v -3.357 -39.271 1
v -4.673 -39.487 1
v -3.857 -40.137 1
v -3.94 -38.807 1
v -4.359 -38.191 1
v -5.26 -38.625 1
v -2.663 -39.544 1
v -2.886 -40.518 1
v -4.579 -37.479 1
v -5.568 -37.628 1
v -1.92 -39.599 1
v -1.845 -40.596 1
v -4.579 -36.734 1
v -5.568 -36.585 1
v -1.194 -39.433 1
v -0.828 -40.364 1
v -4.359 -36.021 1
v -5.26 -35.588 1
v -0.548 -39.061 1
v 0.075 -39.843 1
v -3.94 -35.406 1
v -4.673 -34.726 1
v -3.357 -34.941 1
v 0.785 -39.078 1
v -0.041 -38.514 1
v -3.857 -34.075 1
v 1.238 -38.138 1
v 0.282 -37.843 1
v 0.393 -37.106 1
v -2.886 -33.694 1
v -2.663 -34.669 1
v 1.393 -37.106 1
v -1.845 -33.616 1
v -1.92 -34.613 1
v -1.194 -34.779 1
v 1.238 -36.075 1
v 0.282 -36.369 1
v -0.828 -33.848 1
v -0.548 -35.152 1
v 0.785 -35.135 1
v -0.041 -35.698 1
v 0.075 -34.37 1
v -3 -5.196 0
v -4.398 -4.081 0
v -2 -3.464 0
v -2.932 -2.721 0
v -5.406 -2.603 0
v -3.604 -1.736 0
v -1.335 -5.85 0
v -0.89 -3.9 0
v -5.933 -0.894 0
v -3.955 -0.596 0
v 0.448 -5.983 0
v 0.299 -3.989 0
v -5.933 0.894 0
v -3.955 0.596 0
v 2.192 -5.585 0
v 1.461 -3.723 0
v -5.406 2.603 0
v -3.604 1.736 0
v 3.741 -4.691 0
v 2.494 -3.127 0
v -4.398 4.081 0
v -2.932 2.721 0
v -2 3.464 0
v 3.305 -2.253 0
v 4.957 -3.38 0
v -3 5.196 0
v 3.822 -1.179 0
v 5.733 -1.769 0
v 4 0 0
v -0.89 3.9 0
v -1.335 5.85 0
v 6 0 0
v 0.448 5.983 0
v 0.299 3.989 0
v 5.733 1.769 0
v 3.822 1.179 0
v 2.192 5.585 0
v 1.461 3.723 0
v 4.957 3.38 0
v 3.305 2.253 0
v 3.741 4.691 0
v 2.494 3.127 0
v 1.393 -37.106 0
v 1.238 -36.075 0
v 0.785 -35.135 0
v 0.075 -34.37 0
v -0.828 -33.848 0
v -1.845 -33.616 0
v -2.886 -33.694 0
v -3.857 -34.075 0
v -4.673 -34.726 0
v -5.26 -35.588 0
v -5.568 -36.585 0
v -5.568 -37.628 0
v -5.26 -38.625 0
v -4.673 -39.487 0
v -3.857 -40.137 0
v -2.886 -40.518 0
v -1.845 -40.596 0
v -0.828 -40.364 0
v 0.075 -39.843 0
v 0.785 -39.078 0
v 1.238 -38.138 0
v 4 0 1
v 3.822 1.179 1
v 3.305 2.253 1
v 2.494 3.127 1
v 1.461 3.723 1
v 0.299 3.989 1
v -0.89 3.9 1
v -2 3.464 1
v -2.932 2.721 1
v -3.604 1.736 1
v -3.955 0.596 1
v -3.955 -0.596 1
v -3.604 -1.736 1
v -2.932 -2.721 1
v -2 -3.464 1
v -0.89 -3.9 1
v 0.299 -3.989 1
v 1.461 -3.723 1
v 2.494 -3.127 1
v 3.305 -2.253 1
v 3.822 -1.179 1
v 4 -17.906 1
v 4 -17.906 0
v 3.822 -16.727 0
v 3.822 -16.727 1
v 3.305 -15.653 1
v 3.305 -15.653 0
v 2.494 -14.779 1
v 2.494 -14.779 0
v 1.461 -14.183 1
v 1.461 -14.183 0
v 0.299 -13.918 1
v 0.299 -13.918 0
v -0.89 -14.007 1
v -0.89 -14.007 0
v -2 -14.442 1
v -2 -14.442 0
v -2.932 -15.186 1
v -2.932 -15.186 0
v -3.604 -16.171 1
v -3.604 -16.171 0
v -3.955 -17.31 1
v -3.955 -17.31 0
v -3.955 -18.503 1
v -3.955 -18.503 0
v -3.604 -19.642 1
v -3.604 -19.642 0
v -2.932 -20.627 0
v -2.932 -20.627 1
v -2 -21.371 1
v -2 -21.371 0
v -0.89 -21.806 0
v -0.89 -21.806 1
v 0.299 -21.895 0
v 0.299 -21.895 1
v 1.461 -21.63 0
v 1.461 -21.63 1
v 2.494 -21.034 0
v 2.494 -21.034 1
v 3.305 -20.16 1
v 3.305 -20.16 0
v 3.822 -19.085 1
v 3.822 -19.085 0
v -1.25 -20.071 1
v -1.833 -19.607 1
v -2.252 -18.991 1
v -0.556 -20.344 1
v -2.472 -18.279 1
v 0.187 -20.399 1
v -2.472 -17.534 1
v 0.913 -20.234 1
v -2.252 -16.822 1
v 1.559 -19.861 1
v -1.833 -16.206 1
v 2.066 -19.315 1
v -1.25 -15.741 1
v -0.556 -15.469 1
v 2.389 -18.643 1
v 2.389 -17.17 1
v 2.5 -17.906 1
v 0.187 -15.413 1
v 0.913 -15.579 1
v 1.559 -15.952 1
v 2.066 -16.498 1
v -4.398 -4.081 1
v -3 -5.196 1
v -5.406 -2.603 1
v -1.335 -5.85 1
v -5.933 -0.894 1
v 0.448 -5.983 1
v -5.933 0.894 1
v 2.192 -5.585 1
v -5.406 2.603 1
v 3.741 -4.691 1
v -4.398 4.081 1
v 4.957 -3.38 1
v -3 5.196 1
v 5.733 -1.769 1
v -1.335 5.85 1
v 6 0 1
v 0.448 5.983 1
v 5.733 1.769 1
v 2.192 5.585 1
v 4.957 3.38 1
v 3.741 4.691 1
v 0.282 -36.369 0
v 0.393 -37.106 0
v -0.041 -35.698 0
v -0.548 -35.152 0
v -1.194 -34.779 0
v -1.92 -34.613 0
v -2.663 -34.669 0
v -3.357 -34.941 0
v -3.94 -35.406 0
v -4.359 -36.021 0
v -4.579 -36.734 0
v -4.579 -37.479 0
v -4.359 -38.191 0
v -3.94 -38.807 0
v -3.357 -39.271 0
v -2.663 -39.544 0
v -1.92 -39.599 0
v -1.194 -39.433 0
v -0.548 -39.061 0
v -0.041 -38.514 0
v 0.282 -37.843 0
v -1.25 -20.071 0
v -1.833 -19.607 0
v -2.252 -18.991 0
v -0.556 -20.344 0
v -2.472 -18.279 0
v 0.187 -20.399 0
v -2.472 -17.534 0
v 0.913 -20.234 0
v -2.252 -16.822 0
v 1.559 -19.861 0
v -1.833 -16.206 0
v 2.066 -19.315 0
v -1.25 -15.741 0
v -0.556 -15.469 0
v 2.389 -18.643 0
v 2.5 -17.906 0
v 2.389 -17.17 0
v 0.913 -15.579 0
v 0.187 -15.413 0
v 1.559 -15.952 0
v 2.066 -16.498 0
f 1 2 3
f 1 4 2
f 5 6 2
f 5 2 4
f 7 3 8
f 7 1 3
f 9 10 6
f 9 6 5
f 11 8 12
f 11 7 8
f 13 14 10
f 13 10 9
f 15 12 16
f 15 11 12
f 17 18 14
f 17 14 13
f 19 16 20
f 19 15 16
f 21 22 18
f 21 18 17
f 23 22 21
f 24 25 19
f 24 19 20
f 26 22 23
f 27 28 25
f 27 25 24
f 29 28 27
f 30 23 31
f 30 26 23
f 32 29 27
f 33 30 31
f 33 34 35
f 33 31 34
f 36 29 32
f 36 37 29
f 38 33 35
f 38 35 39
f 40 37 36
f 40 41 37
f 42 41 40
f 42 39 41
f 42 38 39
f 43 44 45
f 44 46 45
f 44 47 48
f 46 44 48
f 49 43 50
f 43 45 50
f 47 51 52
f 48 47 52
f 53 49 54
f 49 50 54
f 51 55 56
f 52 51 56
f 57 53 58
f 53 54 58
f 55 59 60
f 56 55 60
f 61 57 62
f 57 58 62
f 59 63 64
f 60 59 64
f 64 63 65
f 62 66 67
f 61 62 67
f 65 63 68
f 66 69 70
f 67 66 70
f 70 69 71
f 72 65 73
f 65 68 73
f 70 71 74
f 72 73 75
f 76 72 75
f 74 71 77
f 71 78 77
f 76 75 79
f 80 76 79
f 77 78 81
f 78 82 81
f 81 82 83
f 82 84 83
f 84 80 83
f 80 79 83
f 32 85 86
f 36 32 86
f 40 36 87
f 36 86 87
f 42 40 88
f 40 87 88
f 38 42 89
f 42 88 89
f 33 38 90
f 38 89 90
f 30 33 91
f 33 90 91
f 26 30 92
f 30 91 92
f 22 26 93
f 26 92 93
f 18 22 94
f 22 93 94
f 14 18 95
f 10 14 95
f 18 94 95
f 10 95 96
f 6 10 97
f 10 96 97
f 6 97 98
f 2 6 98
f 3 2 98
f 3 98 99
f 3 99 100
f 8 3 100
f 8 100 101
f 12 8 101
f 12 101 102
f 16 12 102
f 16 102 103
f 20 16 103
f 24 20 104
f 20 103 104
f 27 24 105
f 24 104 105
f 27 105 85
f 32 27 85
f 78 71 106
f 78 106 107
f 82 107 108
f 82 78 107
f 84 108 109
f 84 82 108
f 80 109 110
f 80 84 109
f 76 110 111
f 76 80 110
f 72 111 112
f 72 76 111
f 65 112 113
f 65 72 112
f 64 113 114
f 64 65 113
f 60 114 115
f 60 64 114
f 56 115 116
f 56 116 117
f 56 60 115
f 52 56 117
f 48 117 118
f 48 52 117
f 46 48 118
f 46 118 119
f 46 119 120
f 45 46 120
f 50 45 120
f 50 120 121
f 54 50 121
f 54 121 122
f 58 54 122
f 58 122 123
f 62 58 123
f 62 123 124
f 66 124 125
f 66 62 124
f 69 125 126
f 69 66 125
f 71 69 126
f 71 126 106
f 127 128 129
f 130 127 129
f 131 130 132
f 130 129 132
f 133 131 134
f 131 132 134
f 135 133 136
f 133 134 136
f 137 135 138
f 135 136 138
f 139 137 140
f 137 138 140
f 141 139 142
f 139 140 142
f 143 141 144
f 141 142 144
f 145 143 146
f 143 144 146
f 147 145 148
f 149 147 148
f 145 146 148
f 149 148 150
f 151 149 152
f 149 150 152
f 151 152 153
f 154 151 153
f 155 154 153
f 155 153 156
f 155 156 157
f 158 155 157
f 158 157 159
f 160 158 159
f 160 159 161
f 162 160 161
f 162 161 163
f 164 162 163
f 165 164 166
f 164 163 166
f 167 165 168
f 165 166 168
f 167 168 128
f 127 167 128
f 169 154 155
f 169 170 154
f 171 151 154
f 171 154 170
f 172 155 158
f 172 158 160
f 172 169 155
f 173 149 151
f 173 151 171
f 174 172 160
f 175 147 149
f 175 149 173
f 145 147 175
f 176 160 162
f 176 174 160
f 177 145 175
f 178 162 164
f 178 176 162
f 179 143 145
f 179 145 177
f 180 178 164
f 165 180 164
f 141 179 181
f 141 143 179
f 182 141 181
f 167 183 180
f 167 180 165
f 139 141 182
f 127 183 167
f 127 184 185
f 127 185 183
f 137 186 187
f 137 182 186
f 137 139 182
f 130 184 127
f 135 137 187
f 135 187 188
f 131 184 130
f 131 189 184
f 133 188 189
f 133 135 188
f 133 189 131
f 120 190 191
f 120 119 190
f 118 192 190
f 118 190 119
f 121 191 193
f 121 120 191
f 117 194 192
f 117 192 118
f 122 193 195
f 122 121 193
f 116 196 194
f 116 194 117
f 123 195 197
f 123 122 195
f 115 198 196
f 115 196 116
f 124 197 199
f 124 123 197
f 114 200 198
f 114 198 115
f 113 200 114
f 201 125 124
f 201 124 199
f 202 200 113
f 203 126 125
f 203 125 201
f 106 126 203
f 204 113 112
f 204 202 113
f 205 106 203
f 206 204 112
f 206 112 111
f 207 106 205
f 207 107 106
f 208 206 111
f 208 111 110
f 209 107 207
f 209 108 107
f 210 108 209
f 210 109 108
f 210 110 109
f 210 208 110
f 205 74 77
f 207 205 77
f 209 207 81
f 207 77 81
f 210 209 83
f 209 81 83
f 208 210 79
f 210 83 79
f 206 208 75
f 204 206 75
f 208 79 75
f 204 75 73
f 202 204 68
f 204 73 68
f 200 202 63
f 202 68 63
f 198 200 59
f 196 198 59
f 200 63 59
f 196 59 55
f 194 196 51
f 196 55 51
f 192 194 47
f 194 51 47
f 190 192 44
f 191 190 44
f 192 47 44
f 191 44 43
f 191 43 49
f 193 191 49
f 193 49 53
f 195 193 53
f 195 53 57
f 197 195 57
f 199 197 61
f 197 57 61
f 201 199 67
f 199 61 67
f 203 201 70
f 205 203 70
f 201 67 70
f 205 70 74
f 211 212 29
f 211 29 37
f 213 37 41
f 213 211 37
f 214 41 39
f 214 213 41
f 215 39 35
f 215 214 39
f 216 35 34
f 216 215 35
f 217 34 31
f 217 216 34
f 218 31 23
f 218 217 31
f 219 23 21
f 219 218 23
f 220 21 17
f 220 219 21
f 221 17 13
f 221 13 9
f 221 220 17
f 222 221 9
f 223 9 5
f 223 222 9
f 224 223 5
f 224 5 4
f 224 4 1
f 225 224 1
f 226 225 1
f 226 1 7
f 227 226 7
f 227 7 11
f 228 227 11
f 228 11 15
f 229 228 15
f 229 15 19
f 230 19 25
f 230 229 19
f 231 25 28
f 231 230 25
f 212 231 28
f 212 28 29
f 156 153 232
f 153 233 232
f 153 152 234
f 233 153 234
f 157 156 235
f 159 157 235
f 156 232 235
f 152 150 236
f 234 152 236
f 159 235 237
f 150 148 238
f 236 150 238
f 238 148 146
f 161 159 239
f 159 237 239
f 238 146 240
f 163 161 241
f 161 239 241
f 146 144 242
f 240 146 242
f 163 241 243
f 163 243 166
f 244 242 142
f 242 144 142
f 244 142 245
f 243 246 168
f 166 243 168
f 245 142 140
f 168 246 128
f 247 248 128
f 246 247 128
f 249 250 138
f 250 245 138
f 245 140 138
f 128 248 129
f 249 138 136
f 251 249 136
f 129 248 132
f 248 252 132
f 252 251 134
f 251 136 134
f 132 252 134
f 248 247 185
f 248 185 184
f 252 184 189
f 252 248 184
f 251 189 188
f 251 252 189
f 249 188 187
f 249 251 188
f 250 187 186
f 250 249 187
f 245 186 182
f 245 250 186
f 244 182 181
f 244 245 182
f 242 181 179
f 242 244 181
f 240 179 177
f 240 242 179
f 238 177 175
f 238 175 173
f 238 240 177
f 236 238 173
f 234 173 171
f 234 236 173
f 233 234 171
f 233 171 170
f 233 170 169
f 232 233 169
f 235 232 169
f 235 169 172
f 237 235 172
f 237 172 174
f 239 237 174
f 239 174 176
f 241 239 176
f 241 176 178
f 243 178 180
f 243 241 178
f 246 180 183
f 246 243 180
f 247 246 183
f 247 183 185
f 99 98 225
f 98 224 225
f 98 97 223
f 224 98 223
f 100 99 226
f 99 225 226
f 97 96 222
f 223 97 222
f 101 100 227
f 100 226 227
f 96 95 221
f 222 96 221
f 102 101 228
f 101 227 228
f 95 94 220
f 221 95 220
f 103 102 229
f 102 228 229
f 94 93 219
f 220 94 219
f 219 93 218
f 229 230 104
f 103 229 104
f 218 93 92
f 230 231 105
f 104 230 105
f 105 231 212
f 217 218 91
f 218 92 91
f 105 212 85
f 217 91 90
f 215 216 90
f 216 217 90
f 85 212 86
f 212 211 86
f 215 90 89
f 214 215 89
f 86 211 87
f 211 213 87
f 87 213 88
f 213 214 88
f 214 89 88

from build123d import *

# Parameters (mm, degrees)
F0_R     = 6
F0_R_2   = 4
F1_DEPTH = 1
F2_R     = 4
F2_R_2   = 2.5
F3_DEPTH = 1
F4_R     = 3.5
F4_R_2   = 2.5
F5_DEPTH = 1


with BuildPart() as f1:
    # F0 (on Top) → F1 (new body)
    with BuildSketch(Plane.XY):
        Circle(F0_R)
        Circle(F0_R_2, mode=Mode.SUBTRACT)
    extrude(amount=F1_DEPTH)


with BuildPart() as f3:
    # F2 (on Top) → F3 (new body)
    with BuildSketch(Plane.XY):
        with Locations((0, -17.906435)):
            Circle(F2_R)
        with Locations((0, -17.906435)):
            Circle(F2_R_2, mode=Mode.SUBTRACT)
    extrude(amount=F3_DEPTH)


with BuildPart() as f5:
    # F4 (on Top) → F5 (new body)
    with BuildSketch(Plane.XY):
        with Locations((-2.10694, -37.106194)):
            Circle(F4_R)
        with Locations((-2.10694, -37.106194)):
            Circle(F4_R_2, mode=Mode.SUBTRACT)
    extrude(amount=F5_DEPTH)


solid = Compound([f1.part, f3.part, f5.part])
